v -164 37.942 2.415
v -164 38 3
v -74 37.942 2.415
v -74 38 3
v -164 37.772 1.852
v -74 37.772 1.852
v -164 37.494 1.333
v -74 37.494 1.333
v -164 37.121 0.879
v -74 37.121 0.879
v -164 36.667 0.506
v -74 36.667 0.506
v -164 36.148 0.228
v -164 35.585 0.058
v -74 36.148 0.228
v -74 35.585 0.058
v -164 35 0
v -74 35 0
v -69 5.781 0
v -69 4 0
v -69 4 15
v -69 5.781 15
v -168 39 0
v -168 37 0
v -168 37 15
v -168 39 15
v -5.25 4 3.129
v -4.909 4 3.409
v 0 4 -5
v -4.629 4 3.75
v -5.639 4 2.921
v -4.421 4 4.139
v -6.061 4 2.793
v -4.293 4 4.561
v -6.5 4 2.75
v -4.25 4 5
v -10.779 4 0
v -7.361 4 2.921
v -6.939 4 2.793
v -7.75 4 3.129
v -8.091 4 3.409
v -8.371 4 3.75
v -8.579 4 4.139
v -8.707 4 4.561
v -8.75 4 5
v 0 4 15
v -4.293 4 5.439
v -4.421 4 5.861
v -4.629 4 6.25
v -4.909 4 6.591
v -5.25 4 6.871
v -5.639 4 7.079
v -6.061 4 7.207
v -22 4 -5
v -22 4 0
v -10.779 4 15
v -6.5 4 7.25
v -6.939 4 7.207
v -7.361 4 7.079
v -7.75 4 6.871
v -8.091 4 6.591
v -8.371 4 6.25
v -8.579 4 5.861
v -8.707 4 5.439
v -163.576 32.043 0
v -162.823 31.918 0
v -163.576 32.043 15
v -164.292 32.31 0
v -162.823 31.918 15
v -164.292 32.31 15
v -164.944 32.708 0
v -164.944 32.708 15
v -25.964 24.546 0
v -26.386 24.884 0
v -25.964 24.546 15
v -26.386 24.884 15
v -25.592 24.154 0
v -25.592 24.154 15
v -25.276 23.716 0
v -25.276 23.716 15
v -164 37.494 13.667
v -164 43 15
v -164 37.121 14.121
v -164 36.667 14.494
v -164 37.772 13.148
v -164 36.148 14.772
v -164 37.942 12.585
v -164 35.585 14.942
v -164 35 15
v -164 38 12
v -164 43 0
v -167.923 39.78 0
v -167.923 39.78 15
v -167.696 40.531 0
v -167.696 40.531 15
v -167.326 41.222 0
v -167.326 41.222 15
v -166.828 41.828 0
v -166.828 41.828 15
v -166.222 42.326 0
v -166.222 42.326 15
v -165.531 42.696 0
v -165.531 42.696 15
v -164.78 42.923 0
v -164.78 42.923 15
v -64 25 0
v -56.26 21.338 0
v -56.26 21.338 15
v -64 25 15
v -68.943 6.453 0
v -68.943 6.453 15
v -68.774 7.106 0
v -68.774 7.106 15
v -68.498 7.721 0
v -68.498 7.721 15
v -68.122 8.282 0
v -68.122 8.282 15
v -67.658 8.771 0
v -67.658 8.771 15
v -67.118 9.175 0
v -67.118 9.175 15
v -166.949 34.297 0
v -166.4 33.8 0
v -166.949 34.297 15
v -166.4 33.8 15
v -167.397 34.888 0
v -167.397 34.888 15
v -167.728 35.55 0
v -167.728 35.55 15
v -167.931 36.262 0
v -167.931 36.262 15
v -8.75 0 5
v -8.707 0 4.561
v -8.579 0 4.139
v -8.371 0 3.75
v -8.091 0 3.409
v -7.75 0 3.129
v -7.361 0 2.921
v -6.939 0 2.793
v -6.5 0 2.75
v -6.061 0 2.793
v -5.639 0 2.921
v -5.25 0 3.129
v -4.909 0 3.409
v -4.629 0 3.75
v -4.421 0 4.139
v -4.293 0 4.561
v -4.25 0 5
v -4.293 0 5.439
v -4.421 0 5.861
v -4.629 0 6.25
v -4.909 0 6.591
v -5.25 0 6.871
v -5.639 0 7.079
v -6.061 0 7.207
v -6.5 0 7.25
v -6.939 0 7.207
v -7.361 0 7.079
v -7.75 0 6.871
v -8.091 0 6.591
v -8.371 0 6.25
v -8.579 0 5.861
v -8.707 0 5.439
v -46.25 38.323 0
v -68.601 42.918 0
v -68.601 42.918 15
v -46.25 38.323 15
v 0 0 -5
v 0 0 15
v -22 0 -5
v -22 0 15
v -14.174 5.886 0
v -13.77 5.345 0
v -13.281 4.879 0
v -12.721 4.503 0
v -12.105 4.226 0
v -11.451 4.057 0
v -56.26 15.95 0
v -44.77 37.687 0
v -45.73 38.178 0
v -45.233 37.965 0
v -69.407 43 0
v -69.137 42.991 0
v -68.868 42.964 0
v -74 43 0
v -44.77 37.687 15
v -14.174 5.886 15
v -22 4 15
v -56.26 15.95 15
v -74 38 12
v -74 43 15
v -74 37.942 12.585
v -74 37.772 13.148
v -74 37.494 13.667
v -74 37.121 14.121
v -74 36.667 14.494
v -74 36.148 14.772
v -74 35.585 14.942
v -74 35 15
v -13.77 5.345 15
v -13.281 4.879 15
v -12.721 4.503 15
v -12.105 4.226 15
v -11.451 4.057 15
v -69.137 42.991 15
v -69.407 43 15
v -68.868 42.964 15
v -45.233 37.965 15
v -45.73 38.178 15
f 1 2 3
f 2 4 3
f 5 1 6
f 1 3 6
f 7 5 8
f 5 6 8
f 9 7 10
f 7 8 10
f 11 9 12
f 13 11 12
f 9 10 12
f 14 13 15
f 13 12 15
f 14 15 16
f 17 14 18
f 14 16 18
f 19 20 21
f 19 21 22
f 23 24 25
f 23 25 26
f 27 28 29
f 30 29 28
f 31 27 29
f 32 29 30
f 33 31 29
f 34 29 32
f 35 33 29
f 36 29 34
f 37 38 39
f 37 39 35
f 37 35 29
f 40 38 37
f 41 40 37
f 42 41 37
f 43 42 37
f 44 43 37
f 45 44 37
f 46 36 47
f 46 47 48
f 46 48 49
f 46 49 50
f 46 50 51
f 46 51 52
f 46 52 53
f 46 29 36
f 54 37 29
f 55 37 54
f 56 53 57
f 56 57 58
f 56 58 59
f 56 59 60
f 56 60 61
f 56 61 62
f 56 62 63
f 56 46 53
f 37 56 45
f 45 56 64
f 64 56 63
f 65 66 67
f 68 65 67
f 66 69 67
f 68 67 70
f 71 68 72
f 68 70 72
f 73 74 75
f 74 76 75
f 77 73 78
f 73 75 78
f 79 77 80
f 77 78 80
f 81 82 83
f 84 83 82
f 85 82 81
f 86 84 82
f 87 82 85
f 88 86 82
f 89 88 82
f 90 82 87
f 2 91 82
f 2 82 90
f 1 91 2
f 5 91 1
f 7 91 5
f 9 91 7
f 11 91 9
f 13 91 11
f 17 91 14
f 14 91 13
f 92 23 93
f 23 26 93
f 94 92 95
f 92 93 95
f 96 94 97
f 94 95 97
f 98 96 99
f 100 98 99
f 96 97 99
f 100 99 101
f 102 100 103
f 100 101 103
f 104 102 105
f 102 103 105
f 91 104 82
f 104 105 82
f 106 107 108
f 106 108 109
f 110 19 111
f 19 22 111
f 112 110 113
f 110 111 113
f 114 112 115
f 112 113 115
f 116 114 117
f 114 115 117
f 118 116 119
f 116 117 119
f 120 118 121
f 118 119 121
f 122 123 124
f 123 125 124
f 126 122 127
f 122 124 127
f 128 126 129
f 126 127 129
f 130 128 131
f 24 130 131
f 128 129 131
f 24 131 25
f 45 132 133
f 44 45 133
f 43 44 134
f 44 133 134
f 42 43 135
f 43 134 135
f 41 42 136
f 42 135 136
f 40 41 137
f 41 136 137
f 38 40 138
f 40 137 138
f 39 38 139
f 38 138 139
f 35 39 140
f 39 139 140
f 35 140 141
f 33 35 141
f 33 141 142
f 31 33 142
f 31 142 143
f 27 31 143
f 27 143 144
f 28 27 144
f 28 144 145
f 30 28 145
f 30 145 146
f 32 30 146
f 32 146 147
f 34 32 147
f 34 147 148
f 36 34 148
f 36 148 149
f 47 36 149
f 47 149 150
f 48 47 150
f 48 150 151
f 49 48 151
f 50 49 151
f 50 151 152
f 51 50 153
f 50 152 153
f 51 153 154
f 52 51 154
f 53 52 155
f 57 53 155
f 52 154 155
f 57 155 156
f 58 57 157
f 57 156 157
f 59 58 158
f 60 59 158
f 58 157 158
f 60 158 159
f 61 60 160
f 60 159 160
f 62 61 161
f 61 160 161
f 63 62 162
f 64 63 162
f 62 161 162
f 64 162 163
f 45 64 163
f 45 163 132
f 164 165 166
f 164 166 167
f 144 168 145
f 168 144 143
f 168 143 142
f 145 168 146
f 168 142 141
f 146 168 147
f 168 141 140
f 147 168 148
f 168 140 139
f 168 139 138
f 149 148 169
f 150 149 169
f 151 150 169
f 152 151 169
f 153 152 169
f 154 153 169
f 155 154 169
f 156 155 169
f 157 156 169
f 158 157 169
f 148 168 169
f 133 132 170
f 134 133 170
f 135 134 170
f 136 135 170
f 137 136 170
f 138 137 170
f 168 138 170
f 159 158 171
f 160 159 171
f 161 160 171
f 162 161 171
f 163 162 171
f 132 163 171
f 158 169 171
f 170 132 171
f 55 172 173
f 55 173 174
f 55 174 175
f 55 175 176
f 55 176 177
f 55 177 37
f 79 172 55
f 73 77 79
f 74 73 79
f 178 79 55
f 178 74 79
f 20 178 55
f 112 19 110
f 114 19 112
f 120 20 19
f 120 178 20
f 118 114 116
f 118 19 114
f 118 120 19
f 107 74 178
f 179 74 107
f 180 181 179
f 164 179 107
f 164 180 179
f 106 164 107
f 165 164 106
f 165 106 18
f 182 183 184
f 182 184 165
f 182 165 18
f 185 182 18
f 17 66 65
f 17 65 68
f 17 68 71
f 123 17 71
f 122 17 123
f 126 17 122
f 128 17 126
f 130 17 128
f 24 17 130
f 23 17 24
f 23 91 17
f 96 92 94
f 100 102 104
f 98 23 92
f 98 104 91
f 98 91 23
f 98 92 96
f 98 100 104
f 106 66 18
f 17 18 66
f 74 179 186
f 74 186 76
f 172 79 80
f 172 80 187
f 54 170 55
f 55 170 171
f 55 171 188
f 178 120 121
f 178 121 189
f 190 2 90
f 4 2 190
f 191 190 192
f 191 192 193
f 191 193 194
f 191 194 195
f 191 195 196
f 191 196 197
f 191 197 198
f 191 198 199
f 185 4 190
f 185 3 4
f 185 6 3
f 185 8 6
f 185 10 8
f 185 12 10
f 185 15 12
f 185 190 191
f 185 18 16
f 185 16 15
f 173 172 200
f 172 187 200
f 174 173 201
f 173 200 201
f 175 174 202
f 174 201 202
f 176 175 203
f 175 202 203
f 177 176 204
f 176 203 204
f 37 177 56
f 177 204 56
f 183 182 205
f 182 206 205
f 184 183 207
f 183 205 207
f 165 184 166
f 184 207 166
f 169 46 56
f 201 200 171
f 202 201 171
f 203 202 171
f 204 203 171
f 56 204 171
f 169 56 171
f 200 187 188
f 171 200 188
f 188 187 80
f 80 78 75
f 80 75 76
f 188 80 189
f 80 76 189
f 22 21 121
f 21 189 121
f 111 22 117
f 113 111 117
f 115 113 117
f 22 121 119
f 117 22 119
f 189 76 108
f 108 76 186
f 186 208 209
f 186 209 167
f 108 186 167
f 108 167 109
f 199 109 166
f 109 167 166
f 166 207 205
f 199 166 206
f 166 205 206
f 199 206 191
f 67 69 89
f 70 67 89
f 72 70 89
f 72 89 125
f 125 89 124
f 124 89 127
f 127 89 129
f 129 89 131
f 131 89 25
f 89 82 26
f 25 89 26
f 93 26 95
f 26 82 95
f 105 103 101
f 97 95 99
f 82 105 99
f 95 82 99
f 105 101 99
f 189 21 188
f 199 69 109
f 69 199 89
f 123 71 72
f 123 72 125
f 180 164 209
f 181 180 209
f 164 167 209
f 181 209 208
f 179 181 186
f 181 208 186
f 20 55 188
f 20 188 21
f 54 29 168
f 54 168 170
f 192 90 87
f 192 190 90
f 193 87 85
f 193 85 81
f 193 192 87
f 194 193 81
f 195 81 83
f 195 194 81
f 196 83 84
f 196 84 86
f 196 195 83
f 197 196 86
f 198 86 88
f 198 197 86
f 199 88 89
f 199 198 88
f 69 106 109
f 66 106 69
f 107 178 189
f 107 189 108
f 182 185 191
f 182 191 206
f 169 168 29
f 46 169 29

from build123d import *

# Parameters (mm, degrees)
BOSS_EXTRU_1_DEPTH   = 15
CONG_1_R             = 3
CONG_2_R             = 4
ESQUISSE2_W          = 22
ESQUISSE2_H          = 4
BOSS_EXTRU_2_DEPTH   = 5
D_GAGEMENT_M41_D     = 4.5
D_GAGEMENT_M41_DEPTH = 16


with BuildPart() as part:
    # Esquisse1 → Boss.-Extru.1 (new body)
    with BuildSketch(Plane.XY):
        Polygon((0, 0), (-22, 0), (-22, 4), (-69, 4), (-69, 8), (-56.26016699, 15.95016153), (-56.26016699, 21.33814045), (-64, 25), (-164, 32), (-168, 35), (-168, 43), (-164, 43), (-164, 38), (-74, 38), (-74, 43), (-69, 43), (-45.444881322, 38.157051099), (-25.711083844, 24.413870713), (-13, 4), (0, 4), align=None)
    extrude(amount=BOSS_EXTRU_1_DEPTH)

    # Congé1
    cong_1_edges = [part.edges().sort_by_distance(p)[0] for p in [
        (-119, 38, 0),
        (-119, 38, 15),
    ]]
    fillet(cong_1_edges, radius=CONG_1_R)

    # Congé2
    cong_2_edges = [part.edges().sort_by_distance(p)[0] for p in [
        (-69, 8, 7.5),
        (-164, 32, 7.5),
        (-168, 35, 7.5),
        (-168, 43, 7.5),
        (-69, 43, 7.5),
        (-45.444881322, 38.157051099, 7.5),
        (-25.711083844, 24.413870713, 7.5),
        (-13, 4, 7.5),
    ]]
    fillet(cong_2_edges, radius=CONG_2_R - 0.0001)  # a hair under: the kernel refuses the full size

    # Esquisse2 → Boss.-Extru.2 (add)
    with BuildSketch(Plane(origin=(0, 0, 0), x_dir=(-1, 0, 0), z_dir=(0, 0, -1))):
        with Locations((11, 2)):
            Rectangle(ESQUISSE2_W, ESQUISSE2_H)
    extrude(amount=BOSS_EXTRU_2_DEPTH)

    # Dégagement M41
    with Locations(Plane(origin=(0, 4, 0), x_dir=(1, 0, 0), z_dir=(0, 1, 0))):
        with Locations((-6.5, -5)):
            Hole(D_GAGEMENT_M41_D / 2, depth=D_GAGEMENT_M41_DEPTH)


solid = part.part
